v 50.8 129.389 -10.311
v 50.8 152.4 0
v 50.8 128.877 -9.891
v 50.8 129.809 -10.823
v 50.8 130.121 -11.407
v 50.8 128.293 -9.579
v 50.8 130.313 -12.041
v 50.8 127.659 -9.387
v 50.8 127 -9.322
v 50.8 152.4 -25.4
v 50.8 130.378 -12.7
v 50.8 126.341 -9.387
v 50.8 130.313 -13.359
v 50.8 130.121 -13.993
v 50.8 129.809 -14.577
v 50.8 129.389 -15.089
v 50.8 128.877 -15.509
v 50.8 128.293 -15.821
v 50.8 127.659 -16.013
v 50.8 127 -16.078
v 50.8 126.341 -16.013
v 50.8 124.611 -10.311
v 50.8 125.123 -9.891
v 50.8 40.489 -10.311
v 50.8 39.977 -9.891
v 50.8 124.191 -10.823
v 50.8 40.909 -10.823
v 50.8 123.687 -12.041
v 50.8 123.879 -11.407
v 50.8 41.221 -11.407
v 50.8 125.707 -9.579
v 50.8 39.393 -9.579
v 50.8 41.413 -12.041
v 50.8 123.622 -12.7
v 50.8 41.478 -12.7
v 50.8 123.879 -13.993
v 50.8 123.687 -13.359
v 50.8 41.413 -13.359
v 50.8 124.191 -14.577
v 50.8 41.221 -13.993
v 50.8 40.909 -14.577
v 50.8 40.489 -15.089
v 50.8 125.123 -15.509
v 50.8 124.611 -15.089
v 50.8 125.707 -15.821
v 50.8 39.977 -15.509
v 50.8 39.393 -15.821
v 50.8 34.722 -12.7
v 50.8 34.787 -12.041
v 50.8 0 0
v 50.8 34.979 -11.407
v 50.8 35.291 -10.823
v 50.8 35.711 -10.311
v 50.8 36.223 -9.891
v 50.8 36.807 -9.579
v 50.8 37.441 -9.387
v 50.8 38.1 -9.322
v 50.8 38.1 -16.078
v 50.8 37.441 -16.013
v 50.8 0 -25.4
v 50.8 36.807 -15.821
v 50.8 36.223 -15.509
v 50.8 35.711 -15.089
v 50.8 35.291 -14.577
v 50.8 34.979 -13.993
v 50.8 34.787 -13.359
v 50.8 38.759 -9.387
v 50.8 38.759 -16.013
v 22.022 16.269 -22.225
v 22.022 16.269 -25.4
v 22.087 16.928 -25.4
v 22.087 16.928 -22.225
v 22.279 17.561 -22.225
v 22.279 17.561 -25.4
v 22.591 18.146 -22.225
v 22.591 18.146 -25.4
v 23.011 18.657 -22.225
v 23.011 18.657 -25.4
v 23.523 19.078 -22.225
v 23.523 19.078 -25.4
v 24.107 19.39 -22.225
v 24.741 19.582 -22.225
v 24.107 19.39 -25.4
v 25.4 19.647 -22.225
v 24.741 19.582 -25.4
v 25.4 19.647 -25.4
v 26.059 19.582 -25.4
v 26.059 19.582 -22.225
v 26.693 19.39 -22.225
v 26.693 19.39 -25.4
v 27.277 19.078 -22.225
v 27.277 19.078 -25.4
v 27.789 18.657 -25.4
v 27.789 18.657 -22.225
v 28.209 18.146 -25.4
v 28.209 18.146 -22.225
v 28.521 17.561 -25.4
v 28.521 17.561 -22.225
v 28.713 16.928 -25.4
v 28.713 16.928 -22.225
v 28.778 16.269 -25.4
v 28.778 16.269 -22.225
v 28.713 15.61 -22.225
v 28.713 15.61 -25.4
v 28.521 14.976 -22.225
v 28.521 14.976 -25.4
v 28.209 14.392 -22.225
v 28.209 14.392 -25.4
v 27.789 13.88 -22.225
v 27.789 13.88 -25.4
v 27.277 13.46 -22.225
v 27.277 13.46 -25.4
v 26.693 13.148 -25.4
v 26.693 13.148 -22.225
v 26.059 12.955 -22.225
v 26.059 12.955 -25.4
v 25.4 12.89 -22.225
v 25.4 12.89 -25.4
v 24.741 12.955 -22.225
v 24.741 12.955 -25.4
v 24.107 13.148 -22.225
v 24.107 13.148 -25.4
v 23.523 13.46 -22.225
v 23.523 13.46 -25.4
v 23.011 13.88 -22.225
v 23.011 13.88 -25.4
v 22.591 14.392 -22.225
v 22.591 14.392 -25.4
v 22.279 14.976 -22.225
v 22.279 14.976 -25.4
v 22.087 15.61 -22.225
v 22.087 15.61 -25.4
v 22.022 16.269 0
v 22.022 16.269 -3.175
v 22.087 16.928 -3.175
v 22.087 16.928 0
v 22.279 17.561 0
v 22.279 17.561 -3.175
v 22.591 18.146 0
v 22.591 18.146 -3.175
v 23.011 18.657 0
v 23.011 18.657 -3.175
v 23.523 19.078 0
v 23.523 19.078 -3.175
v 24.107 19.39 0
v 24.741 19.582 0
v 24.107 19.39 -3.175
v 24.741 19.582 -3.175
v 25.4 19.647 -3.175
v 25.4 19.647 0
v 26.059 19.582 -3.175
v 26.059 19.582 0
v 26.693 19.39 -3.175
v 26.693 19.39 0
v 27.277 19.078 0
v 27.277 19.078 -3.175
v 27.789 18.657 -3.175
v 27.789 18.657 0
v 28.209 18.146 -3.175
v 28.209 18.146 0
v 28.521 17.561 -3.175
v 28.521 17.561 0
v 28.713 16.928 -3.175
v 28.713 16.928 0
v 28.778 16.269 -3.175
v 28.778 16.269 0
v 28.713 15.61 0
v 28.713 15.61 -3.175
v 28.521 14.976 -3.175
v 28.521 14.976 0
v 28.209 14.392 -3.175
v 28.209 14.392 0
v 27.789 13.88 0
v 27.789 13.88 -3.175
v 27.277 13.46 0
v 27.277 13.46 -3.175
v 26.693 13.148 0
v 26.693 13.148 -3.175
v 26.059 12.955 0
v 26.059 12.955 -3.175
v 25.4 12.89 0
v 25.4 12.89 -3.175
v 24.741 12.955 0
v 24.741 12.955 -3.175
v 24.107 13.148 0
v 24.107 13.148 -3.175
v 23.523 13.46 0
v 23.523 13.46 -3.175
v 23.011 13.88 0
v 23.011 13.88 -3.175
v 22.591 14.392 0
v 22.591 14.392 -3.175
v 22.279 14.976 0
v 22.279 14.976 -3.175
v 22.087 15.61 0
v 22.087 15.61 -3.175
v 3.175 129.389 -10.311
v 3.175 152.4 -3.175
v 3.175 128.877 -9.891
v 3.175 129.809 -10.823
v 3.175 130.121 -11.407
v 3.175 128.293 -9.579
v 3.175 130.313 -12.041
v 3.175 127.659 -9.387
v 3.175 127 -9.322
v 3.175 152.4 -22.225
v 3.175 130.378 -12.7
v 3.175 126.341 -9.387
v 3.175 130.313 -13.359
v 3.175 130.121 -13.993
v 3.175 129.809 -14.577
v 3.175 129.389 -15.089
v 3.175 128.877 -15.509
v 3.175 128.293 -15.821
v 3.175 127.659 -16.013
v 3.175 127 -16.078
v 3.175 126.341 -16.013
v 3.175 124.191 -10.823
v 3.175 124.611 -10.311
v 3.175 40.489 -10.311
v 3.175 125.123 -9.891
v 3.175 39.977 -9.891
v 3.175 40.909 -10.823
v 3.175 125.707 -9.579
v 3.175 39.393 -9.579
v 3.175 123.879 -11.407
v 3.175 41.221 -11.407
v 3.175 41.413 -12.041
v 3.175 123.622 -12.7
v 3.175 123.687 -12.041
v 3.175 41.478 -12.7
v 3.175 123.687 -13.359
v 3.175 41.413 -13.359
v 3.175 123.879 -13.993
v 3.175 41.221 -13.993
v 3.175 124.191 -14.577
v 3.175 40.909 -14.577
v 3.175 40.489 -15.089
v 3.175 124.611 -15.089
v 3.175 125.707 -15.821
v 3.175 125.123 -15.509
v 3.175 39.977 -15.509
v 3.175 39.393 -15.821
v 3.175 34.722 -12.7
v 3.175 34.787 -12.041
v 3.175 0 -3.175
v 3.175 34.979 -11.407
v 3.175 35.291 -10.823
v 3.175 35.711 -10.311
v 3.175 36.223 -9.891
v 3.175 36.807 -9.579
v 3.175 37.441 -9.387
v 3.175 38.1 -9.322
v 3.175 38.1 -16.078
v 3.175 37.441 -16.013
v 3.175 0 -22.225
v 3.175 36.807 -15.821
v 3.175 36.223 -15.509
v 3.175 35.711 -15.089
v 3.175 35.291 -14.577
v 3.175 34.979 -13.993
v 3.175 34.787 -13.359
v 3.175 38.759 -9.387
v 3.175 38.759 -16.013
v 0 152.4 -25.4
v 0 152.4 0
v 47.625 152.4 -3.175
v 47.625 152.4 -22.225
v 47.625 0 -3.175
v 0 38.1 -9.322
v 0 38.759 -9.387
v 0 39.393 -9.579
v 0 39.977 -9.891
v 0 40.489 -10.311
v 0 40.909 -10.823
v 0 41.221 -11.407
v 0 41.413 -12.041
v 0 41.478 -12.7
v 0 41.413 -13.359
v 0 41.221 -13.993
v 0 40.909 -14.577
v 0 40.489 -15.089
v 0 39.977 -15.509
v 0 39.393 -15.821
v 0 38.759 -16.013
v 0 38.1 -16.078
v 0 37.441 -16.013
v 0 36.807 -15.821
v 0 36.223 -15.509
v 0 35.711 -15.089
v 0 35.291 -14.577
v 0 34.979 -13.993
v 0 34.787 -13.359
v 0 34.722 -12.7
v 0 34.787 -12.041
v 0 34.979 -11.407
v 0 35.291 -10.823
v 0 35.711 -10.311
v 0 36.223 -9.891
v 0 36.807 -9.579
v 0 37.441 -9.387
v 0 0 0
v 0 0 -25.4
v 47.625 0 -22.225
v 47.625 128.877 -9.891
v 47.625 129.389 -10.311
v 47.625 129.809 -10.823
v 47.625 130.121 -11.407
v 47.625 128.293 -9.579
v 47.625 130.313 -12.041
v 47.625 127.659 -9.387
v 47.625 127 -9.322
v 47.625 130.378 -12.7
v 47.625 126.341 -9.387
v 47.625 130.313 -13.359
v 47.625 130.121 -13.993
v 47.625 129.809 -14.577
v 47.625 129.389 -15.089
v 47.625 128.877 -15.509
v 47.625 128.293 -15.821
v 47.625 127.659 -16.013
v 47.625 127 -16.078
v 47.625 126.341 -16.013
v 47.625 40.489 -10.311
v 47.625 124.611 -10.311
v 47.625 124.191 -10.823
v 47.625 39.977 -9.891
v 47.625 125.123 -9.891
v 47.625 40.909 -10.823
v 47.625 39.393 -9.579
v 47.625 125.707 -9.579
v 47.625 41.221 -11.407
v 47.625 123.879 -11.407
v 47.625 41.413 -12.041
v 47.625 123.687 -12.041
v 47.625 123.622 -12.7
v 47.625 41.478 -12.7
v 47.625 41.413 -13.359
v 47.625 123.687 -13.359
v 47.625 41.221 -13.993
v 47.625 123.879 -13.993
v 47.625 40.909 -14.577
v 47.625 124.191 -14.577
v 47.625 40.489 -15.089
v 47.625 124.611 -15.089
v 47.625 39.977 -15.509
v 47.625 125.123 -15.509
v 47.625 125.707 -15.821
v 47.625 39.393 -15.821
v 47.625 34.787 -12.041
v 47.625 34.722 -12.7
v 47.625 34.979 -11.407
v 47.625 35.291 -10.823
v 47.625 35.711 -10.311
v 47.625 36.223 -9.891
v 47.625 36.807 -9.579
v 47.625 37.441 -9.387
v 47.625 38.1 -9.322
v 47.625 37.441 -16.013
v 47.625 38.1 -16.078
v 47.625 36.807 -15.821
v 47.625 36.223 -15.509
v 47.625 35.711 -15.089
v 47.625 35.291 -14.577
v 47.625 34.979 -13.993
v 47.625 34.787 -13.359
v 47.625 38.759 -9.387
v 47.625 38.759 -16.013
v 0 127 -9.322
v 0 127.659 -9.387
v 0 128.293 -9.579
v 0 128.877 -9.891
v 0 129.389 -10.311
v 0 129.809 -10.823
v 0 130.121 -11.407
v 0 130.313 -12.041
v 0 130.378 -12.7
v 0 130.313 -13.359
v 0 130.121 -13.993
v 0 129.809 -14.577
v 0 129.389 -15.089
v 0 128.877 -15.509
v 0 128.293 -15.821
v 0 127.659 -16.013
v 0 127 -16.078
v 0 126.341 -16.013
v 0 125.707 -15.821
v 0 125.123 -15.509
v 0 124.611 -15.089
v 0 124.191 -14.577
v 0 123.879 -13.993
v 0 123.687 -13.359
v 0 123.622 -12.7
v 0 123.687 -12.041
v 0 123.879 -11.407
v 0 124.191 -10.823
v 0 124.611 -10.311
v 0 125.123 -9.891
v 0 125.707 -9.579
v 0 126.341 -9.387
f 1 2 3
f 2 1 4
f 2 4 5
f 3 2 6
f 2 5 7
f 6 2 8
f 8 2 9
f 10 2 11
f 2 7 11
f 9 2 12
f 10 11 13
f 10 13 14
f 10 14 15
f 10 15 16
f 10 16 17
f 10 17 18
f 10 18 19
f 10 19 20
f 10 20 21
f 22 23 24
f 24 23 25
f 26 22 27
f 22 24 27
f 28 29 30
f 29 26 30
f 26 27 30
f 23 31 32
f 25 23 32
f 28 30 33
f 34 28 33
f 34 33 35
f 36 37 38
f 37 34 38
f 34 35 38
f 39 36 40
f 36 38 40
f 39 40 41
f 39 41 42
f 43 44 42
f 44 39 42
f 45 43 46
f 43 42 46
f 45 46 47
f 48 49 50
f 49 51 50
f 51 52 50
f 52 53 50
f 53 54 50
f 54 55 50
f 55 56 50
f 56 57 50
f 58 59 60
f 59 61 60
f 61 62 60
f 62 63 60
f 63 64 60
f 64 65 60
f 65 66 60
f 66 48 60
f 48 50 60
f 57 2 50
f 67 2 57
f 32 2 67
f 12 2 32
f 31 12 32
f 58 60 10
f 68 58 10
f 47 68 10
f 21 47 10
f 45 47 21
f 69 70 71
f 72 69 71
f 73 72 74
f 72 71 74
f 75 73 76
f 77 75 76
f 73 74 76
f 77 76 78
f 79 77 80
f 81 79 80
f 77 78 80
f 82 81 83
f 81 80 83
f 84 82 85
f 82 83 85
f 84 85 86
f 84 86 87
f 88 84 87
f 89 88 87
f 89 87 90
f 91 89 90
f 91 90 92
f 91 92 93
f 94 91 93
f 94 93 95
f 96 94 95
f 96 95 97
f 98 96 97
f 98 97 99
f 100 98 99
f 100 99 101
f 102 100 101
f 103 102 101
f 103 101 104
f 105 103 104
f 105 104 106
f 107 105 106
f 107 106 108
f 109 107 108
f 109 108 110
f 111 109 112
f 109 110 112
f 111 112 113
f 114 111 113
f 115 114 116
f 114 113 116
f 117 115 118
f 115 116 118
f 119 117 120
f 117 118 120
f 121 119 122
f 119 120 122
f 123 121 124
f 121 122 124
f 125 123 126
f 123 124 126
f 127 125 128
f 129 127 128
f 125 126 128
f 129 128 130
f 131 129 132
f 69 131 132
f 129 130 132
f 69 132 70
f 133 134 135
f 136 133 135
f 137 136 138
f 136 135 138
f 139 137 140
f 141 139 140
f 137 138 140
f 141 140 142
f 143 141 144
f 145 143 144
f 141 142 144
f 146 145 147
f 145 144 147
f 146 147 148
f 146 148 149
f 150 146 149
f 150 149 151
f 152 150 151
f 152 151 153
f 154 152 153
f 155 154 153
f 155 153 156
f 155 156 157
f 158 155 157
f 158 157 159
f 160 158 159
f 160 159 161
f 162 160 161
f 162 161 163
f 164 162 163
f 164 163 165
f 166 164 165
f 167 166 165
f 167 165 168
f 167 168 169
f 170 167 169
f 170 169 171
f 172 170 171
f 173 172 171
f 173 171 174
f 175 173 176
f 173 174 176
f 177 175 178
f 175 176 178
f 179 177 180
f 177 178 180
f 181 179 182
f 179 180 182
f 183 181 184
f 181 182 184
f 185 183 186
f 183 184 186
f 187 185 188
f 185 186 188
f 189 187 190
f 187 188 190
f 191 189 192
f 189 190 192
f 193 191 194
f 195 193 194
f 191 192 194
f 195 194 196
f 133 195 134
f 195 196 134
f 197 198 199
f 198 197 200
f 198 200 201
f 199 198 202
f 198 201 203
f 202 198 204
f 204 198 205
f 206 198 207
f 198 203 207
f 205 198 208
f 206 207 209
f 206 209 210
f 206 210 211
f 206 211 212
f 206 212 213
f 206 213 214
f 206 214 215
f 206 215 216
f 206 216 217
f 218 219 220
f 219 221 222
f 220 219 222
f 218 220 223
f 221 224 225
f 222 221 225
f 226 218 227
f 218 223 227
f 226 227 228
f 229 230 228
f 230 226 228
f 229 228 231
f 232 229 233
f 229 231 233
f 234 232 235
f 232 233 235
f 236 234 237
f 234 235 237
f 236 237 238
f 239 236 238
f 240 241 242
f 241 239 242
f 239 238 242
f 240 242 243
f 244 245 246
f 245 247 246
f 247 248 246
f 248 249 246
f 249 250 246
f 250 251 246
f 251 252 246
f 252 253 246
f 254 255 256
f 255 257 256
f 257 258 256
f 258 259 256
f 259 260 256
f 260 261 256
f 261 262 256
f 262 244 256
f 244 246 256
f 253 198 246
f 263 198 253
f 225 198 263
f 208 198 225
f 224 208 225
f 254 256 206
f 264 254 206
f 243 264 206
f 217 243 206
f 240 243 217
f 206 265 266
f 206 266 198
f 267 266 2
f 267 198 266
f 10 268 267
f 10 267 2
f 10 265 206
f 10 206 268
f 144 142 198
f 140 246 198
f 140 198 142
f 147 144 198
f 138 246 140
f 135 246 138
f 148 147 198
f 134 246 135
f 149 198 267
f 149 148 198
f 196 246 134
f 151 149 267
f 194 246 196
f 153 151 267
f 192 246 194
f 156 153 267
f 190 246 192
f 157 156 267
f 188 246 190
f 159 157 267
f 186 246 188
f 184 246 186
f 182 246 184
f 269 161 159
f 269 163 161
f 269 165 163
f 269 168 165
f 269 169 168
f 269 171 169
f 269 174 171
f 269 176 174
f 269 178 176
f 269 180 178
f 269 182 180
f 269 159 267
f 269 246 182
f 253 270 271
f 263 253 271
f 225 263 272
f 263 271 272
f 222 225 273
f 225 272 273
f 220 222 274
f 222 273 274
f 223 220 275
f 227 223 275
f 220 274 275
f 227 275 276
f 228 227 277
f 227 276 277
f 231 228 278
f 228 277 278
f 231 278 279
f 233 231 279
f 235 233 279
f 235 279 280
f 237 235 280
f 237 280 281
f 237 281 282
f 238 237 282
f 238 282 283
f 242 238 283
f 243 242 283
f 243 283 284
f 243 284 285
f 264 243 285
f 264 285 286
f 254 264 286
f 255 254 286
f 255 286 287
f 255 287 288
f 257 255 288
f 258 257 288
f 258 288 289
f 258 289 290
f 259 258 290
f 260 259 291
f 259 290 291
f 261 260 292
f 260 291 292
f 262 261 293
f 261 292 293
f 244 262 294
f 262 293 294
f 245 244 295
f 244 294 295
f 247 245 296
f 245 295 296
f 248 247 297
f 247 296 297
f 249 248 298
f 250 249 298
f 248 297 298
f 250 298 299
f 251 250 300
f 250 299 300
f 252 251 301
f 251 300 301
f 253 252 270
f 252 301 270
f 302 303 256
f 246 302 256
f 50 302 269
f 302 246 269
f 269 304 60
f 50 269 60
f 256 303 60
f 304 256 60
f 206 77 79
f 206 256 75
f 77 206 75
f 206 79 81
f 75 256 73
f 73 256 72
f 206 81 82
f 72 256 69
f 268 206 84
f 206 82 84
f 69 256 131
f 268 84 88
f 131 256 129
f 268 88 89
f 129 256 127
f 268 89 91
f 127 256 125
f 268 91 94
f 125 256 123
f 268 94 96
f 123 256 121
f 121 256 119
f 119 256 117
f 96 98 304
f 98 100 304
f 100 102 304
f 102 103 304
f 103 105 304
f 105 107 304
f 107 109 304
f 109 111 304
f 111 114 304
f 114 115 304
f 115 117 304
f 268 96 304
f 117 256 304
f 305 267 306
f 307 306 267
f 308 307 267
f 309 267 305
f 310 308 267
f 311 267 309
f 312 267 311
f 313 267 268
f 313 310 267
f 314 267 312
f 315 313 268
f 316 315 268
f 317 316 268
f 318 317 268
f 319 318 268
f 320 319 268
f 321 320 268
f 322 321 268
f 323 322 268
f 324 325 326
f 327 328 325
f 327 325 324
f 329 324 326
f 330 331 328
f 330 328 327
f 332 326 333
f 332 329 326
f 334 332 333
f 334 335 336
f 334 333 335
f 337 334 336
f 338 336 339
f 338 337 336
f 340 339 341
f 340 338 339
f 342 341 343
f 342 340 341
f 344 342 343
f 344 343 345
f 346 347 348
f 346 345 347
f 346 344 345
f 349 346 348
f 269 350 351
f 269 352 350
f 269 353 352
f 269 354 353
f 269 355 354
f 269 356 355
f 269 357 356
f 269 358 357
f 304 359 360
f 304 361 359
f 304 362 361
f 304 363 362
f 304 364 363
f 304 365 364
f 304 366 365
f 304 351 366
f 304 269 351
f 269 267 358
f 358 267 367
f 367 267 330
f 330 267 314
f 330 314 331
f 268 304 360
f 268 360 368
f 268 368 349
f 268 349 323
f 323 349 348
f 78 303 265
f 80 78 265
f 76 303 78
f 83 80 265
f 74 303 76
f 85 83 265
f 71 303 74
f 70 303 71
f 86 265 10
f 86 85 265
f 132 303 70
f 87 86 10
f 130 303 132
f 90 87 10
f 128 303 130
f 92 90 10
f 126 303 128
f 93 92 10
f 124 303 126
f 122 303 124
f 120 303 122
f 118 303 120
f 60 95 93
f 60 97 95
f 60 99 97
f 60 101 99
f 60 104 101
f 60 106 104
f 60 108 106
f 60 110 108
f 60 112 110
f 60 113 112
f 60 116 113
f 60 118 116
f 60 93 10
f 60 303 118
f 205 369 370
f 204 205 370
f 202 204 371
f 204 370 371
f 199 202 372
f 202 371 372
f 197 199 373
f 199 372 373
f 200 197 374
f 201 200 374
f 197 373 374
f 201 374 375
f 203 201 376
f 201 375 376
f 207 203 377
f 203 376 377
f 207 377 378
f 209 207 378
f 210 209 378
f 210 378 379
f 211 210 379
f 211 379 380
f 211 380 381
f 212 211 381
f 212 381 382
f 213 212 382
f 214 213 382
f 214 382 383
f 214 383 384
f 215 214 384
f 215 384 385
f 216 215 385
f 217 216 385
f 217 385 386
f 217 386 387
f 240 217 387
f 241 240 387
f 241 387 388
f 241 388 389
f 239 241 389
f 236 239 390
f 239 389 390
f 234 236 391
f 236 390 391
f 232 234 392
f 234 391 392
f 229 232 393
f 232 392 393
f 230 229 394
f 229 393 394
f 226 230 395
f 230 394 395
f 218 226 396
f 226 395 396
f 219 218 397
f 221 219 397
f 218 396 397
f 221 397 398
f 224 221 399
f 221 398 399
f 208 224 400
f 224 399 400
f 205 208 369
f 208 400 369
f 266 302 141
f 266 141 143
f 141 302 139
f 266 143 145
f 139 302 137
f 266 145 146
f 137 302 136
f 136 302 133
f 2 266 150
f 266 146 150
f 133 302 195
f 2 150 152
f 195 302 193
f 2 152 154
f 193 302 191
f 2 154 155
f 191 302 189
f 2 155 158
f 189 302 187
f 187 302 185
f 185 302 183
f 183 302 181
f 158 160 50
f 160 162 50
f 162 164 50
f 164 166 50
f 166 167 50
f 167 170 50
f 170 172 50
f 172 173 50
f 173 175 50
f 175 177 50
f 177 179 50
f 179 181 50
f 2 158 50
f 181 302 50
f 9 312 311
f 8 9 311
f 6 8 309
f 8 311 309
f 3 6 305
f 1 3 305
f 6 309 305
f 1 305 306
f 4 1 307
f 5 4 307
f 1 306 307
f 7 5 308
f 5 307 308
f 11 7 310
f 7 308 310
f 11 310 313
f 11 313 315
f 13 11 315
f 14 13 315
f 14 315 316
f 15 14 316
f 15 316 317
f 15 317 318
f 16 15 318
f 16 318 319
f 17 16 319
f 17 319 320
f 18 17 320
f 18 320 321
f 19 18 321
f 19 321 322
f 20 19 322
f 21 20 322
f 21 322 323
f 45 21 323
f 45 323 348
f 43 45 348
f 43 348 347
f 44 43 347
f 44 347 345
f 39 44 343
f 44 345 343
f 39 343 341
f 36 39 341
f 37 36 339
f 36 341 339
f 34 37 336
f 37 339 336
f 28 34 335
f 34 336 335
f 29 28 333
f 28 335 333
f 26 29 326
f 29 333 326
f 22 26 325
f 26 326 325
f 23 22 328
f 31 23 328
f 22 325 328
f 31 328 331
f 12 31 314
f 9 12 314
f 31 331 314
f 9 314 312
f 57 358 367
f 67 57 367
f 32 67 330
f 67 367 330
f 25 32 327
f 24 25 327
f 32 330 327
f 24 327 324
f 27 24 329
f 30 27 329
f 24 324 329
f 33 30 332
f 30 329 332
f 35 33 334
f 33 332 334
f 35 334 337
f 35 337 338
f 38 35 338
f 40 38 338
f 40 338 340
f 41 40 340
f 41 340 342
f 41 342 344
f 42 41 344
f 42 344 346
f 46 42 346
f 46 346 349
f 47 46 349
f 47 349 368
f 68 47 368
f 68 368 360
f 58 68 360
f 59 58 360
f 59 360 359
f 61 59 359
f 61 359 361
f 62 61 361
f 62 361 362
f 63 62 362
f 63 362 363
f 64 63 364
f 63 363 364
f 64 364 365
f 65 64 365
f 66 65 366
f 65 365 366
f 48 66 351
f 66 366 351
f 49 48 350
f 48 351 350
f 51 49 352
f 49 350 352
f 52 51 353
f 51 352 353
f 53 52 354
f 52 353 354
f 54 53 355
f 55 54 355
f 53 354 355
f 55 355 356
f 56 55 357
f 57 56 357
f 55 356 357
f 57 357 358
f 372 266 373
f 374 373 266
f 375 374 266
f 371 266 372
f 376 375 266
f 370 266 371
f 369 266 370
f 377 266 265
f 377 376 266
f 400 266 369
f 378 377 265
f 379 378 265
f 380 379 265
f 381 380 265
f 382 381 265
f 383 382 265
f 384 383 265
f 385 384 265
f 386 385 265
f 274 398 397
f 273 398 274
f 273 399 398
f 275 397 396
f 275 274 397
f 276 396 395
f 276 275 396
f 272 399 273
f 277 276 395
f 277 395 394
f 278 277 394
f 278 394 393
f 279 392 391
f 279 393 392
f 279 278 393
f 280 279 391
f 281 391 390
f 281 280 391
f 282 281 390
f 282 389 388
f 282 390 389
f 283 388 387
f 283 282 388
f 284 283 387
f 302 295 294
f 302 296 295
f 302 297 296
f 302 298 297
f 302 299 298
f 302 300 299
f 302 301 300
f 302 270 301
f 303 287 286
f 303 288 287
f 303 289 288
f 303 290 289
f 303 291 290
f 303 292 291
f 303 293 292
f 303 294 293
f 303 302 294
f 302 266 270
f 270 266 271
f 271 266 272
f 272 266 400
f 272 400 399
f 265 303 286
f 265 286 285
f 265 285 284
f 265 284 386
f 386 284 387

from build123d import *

# Parameters (mm, degrees)
SKETCH1_W           = 50.8
SKETCH1_H           = 25.4
SKETCH1_W_2         = 44.45
SKETCH1_H_2         = 19.05
BOSS_EXTRUDE1_DEPTH = 152.4
SKETCH2_R           = 3.3782
CUT_EXTRUDE1_DEPTH  = 51.8
SKETCH3_R           = 3.3782
CUT_EXTRUDE2_DEPTH  = 26.4


with BuildPart() as part:
    # Sketch1 → Boss-Extrude1 (new body)
    with BuildSketch(Plane(origin=(0, 0, 0), x_dir=(1, 0, 0), z_dir=(0, 1, 0))):
        with Locations((25.4, 12.7)):
            Rectangle(SKETCH1_W, SKETCH1_H)
        with Locations((25.4, 12.7)):
            Rectangle(SKETCH1_W_2, SKETCH1_H_2, mode=Mode.SUBTRACT)
    extrude(amount=BOSS_EXTRUDE1_DEPTH)

    # Sketch2 → Cut-Extrude1 (cut, through all)
    with BuildSketch(Plane.ZY):
        with Locations((-12.7, 127)):
            Circle(SKETCH2_R)
        with Locations((-12.7, 38.1)):
            Circle(SKETCH2_R)
    extrude(amount=-CUT_EXTRUDE1_DEPTH, mode=Mode.SUBTRACT)

    # Sketch3 → Cut-Extrude2 (cut, through all)
    with BuildSketch(Plane(origin=(0, 0, -25.4), x_dir=(-1, 0, 0), z_dir=(0, 0, -1))):
        with Locations((-25.4, 16.2687)):
            Circle(SKETCH3_R)
    extrude(amount=-CUT_EXTRUDE2_DEPTH, mode=Mode.SUBTRACT)


solid = part.part
